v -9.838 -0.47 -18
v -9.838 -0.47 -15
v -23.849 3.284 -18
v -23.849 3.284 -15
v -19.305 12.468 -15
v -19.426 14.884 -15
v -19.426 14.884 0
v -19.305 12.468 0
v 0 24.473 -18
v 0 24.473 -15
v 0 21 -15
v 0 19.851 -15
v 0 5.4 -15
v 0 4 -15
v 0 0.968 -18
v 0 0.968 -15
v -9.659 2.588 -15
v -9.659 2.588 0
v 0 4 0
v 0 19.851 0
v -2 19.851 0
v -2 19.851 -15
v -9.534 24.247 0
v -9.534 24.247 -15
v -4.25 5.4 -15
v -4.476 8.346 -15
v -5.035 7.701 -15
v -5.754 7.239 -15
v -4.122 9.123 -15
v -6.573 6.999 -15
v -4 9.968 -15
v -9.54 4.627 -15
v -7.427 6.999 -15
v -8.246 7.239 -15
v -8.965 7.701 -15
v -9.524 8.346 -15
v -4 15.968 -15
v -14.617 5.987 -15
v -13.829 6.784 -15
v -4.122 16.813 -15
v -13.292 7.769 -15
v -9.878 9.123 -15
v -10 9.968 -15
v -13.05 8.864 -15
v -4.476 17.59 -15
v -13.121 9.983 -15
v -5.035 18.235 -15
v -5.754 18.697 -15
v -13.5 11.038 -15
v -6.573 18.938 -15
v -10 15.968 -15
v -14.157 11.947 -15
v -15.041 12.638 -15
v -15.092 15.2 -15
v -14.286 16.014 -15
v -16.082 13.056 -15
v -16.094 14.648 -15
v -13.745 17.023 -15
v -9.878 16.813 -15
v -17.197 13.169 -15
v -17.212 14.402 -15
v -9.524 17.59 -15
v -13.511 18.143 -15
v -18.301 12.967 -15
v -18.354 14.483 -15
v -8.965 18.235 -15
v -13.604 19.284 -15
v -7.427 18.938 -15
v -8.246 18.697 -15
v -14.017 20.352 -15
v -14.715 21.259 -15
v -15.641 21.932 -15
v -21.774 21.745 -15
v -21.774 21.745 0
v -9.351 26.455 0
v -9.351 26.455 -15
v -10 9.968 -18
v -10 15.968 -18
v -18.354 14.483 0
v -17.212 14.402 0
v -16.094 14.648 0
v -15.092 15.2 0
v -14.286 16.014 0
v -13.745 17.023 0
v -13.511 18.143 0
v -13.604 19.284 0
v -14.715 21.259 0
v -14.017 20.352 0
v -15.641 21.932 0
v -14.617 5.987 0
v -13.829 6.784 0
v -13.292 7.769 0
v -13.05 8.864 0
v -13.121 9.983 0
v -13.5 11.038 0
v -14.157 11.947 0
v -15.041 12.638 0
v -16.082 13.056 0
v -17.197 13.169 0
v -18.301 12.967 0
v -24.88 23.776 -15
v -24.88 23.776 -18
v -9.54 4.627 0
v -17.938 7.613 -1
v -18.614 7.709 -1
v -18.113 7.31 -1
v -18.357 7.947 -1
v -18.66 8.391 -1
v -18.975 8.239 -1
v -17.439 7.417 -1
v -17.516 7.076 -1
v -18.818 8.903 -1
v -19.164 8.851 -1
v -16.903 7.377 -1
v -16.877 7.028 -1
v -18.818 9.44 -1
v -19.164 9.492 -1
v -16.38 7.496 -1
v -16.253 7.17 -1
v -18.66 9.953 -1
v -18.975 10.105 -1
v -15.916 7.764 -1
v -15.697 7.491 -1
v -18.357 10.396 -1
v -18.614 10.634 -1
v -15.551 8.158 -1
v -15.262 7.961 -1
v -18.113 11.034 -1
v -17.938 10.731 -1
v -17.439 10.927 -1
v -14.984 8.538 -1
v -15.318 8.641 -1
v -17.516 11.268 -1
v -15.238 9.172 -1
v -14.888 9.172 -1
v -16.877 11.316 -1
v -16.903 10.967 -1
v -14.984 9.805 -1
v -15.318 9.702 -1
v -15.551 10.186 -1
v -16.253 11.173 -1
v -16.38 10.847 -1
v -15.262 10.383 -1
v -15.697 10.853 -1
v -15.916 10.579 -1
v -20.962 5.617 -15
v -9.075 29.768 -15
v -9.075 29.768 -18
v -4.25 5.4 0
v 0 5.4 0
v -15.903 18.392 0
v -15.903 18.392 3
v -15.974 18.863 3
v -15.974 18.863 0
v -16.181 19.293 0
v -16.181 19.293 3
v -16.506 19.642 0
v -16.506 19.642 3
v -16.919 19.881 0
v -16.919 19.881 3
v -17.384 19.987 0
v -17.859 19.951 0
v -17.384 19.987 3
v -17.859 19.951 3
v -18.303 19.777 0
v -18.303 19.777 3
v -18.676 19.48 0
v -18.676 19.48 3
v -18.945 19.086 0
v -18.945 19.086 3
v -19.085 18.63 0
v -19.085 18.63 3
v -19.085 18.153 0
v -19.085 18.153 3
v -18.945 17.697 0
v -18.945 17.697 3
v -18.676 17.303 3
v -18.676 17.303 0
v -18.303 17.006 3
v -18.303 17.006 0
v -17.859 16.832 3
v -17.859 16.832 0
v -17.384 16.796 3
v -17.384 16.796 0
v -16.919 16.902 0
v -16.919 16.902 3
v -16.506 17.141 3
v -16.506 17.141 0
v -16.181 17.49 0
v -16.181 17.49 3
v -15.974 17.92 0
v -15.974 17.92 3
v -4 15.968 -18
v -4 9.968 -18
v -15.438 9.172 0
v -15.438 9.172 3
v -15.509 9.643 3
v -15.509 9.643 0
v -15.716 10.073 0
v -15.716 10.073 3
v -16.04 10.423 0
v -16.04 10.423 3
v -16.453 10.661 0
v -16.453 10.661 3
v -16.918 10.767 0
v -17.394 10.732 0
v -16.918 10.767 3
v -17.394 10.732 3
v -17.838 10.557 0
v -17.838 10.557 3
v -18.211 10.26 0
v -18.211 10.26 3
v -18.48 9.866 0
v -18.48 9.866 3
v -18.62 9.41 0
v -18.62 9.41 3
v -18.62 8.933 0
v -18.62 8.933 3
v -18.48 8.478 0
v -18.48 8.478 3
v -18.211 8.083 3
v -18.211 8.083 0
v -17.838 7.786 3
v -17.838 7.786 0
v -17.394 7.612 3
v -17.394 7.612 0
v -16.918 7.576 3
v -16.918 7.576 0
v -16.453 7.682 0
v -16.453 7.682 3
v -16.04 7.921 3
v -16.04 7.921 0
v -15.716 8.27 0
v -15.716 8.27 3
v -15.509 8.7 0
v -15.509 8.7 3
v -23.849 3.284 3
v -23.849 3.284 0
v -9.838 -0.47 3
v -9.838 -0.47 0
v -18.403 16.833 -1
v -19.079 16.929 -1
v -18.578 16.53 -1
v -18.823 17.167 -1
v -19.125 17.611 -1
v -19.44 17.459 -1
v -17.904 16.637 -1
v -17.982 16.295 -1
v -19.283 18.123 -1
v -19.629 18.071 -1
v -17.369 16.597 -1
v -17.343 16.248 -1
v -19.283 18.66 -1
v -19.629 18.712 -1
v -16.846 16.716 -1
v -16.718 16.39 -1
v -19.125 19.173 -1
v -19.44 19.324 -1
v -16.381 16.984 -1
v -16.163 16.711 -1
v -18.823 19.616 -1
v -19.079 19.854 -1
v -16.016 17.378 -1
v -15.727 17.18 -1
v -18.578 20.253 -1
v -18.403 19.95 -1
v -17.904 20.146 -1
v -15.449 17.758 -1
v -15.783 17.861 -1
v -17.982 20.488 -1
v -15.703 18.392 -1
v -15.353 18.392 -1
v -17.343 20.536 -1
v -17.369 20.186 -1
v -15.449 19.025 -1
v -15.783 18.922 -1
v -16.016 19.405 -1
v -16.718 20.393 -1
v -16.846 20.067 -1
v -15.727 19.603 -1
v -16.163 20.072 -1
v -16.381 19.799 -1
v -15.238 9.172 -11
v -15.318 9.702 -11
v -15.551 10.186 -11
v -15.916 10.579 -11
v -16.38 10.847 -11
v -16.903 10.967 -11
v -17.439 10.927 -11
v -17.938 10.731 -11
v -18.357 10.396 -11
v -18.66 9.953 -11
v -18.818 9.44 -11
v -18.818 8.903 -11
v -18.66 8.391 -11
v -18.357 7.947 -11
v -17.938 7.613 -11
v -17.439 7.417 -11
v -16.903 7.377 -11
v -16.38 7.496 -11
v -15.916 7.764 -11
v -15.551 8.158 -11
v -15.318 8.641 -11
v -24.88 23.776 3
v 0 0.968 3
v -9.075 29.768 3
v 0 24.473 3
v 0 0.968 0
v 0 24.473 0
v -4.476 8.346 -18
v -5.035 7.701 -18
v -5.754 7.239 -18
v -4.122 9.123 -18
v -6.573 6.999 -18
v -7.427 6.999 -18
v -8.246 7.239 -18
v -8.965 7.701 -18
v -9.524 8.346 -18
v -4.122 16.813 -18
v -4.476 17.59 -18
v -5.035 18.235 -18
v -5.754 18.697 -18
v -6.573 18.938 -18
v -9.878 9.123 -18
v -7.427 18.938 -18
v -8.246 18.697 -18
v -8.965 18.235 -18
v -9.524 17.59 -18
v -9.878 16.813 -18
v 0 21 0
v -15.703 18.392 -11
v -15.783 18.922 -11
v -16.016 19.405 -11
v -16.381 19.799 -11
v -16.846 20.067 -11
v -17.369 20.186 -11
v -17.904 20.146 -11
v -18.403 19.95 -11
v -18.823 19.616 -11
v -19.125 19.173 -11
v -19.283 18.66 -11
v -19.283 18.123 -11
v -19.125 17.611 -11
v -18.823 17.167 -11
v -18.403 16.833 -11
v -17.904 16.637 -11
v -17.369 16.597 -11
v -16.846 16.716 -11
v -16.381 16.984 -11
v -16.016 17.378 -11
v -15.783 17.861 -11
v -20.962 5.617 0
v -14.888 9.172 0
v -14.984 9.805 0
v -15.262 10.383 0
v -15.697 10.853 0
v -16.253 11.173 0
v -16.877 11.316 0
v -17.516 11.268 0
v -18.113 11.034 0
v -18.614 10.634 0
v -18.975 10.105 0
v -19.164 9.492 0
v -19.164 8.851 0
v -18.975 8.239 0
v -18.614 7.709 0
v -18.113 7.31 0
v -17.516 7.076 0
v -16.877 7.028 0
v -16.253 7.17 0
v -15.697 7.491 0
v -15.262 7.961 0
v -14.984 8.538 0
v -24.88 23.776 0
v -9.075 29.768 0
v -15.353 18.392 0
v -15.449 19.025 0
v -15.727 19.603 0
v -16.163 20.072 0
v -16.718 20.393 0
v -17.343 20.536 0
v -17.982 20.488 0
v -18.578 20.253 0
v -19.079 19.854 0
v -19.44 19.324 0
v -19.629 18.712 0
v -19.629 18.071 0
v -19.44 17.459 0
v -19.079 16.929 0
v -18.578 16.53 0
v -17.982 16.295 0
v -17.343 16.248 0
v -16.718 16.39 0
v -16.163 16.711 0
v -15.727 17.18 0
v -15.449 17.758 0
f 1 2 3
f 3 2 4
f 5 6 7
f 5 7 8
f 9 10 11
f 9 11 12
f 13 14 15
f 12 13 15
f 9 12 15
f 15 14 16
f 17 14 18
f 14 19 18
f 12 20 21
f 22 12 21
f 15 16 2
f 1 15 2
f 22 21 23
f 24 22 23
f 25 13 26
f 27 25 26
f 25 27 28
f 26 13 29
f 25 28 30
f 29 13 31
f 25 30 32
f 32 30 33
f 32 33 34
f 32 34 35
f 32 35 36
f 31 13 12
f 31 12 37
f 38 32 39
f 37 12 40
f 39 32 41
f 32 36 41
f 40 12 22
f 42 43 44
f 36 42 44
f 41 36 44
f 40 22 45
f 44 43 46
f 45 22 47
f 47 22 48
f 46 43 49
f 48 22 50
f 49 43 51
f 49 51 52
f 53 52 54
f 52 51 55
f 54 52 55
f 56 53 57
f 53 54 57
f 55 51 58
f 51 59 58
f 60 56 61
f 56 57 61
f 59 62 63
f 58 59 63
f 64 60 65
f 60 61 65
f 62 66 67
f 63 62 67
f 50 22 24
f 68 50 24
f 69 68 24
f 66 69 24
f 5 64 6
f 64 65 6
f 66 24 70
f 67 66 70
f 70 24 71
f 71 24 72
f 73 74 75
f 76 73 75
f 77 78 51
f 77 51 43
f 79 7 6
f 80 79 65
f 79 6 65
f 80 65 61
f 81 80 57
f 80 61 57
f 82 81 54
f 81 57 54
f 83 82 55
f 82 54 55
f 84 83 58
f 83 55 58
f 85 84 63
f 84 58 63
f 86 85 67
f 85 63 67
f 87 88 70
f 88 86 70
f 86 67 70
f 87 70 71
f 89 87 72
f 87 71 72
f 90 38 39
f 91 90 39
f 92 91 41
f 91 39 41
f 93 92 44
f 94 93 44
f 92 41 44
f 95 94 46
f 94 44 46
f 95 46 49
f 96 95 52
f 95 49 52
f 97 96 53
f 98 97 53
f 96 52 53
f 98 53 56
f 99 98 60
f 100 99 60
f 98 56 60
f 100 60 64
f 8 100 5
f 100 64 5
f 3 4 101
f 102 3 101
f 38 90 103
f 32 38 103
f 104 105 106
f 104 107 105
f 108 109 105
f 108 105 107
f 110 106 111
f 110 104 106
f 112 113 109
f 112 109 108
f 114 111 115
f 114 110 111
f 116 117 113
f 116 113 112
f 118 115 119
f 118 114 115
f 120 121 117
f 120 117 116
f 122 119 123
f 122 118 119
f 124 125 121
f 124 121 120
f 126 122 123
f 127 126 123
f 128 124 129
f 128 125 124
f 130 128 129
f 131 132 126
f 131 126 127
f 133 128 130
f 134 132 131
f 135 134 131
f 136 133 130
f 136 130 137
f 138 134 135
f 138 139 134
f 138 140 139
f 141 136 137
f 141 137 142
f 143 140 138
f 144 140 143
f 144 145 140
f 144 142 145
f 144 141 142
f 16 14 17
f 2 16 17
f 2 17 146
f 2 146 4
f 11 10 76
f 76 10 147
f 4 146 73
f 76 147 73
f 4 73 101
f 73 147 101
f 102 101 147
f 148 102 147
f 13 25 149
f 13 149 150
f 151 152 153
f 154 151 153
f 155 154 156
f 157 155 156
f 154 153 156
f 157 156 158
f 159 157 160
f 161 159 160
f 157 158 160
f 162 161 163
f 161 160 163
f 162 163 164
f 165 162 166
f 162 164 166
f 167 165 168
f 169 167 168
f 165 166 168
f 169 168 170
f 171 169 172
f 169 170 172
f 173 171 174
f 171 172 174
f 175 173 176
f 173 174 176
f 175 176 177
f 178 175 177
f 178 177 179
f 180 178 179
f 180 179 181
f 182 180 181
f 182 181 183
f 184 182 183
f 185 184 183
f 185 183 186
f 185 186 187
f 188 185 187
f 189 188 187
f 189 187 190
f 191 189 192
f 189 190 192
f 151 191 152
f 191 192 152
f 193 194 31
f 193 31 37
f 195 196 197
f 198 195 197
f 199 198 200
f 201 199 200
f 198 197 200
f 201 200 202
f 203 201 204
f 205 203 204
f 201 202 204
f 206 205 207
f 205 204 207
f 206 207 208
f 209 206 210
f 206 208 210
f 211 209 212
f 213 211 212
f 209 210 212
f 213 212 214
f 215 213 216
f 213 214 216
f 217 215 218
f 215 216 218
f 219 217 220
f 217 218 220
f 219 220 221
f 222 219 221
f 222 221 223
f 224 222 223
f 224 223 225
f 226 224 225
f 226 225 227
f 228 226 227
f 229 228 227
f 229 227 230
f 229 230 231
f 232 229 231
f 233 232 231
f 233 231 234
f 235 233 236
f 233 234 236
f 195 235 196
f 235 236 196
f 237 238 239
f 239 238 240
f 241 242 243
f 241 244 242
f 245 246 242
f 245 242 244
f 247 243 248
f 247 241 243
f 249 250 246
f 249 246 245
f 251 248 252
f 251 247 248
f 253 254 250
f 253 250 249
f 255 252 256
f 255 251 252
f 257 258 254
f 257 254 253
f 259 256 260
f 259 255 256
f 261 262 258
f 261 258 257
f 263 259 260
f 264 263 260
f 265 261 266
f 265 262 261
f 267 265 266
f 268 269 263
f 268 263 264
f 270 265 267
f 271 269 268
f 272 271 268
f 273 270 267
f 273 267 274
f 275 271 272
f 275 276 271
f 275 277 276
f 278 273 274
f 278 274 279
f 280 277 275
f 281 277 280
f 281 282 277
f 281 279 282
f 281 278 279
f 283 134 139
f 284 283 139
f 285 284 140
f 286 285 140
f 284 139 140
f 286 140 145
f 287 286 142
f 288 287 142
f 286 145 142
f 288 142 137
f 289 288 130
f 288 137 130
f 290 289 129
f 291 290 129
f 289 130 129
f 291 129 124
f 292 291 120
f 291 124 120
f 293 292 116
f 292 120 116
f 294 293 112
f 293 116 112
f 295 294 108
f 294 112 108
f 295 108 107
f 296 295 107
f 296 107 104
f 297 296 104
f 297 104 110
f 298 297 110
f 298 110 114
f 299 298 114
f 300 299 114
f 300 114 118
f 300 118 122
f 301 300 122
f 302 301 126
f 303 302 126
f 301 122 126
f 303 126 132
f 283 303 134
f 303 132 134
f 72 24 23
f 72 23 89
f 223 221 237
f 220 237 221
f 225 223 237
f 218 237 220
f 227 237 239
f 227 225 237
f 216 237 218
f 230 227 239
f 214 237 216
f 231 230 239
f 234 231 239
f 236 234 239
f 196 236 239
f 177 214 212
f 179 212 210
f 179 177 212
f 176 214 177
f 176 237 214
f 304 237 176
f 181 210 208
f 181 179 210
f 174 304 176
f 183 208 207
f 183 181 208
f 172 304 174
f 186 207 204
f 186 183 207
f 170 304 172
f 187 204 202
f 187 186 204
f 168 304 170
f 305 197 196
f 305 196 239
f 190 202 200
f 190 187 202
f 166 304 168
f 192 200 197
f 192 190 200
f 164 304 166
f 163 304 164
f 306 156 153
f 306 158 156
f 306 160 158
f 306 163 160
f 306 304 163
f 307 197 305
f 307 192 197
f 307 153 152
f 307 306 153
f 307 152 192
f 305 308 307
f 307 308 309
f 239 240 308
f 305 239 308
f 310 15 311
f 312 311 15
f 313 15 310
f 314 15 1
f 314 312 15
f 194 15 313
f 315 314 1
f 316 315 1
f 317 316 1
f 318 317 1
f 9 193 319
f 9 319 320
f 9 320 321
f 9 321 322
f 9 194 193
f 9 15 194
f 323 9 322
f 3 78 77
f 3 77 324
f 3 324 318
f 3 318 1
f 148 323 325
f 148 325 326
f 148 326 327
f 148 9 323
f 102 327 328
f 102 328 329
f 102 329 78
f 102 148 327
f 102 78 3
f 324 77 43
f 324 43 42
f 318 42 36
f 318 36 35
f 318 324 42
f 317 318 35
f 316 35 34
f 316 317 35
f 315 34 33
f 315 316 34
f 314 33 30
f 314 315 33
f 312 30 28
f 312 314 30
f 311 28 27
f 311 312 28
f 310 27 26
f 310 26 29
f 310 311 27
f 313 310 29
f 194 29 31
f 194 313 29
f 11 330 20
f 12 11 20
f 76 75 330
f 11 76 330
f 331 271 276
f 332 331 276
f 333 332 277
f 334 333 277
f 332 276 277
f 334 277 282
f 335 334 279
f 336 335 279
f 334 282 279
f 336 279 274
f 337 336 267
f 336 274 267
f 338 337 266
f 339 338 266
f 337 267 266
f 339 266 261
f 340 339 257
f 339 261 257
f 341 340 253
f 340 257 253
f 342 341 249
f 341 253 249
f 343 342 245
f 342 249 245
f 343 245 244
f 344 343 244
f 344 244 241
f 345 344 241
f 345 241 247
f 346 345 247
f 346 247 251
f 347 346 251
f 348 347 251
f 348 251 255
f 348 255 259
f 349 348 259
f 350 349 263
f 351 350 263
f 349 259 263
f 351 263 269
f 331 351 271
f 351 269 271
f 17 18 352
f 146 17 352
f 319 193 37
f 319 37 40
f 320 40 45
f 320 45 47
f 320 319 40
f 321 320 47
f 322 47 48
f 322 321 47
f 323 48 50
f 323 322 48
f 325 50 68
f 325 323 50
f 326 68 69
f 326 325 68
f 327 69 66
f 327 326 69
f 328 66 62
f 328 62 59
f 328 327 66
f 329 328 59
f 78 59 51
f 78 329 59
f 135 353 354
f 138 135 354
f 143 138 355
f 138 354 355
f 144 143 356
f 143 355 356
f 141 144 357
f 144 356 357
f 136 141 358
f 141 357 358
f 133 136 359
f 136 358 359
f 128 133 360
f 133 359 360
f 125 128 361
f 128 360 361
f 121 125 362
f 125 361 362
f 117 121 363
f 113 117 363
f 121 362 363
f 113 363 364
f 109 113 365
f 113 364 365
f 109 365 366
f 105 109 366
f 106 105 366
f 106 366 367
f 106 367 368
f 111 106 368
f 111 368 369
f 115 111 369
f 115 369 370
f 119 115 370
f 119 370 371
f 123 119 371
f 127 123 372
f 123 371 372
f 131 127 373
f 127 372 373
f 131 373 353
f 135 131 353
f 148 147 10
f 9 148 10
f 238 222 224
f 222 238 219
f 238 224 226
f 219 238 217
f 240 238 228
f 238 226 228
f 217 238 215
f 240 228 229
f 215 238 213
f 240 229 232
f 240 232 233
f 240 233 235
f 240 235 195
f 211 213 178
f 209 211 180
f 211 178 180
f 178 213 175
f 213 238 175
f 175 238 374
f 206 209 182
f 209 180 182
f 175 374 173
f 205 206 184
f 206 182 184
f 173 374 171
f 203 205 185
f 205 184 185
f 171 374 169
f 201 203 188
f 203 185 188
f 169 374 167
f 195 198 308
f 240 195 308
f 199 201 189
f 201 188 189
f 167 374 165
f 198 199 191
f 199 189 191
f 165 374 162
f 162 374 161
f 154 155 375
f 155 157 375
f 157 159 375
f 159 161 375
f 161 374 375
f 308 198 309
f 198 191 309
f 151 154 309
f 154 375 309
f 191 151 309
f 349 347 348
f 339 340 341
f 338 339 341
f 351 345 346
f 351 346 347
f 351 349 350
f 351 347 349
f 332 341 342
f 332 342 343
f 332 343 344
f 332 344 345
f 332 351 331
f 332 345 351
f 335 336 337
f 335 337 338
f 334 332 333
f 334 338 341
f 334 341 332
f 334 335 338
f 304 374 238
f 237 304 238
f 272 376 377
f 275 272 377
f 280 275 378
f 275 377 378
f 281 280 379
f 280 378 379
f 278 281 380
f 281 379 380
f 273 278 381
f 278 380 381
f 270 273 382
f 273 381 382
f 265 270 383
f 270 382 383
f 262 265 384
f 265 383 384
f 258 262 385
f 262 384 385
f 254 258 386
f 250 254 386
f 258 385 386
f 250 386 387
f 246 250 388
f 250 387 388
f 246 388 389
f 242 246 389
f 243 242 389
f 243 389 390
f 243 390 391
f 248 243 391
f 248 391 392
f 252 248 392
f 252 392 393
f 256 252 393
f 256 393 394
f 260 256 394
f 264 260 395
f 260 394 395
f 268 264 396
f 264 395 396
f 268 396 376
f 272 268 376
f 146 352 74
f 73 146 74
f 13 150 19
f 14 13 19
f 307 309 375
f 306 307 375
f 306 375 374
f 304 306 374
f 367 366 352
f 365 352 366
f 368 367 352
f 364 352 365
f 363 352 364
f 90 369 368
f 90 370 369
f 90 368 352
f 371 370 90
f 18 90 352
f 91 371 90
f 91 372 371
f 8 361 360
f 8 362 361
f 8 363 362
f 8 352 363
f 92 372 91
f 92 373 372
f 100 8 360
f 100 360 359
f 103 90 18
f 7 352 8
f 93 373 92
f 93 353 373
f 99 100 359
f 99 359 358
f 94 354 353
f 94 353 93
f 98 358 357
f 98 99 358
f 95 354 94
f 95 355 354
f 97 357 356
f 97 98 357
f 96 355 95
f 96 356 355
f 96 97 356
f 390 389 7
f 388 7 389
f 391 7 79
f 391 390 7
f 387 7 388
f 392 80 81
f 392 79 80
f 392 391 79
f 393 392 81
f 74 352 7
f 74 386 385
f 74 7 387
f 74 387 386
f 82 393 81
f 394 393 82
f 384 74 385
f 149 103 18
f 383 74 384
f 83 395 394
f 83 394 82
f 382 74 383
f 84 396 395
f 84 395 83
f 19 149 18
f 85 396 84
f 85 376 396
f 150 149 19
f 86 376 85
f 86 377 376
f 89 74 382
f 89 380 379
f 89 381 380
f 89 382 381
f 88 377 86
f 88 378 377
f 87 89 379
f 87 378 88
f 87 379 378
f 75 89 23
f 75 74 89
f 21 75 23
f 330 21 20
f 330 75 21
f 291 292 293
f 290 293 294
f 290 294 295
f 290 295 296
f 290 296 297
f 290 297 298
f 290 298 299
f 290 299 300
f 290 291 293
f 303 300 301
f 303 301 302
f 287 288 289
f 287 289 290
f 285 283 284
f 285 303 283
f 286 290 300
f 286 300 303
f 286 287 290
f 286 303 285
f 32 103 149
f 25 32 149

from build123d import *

# Parameters (mm, degrees)
EXTRUDE_1_DEPTH     = 15
EXTRUDE_2_DEPTH     = 3
SKETCH_4_R          = 4
EXTRUDE_3_DEPTH     = 15
EXTRUDE_4_DEPTH     = 3
SKETCH_6_R          = 1.6
CUT_EXTRUDE_1_DEPTH = 3
CUT_EXTRUDE_3_DEPTH = 3
SKETCH_9_R          = 2.15
CUT_EXTRUDE_4_DEPTH = 1
SKETCH_10_R         = 1.8
CUT_EXTRUDE_5_DEPTH = 10


with BuildPart() as part:
    # 草图1 → 凸台-拉伸1 (new body)
    with BuildSketch(Plane.XY):
        Polygon((-1.29e-06, 20.99999997), (-1.203e-06, 19.851325014), (-2.000001203, 19.851325014), (-9.534071771, 24.246698834), (-19.703272348, 20.391514412), (-19.03799413, 7.171769436), (-9.540202332, 4.62684286), (-4.25044565, 5.4), (-1.06e-07, 5.4), (0, 4), (-9.659258026, 2.588191337), (-20.962273217, 5.61682624), (-21.773937734, 21.745413673), (-9.350615446, 26.455144608), align=None)
    extrude(amount=-EXTRUDE_1_DEPTH)

    # 草图2 → 凸台-拉伸2 (add)
    with BuildSketch(Plane(origin=(0, 0, -15), x_dir=(-1, 0, 0), z_dir=(0, 0, -1))):
        Polygon((1.203e-06, 24.473211103), (1.203e-06, 0.968124522), (9.837841565, -0.469785948), (23.848691848, 3.284411448), (24.879935811, 23.776262564), (9.075430959, 29.76781327), align=None)
    extrude(amount=EXTRUDE_2_DEPTH)

    # 草图4 → 凸台-拉伸3 (add)
    with BuildSketch(Plane.XY.offset(-15)):
        with Locations((-17.503272348, 18.391514412)):
            Circle(SKETCH_4_R)
        with Locations((-17.03799413, 9.171769436)):
            Circle(SKETCH_4_R)
    extrude(amount=EXTRUDE_3_DEPTH)

    # 草图8 → 切除-拉伸3 (cut)
    with BuildSketch(Plane(origin=(0, 0, -18), x_dir=(-1, 0, 0), z_dir=(0, 0, -1))):
        with BuildLine():
            Line((10.000001203, 15.968124522), (10.000001203, 9.968124522))
            ThreePointArc((10.000001203, 9.968124522), (7.000001203, 6.968124522), (4.000001203, 9.968124522))
            Line((4.000001203, 9.968124522), (4.000001203, 15.968124522))
            ThreePointArc((4.000001203, 15.968124522), (7.000001203, 18.968124522), (10.000001203, 15.968124522))
        make_face()
    extrude(amount=-CUT_EXTRUDE_3_DEPTH, mode=Mode.SUBTRACT)

    # 草图9 → 切除-拉伸4 (cut)
    with BuildSketch(Plane.XY):
        with Locations((-17.503272348, 18.391514412)):
            Circle(SKETCH_9_R)
        with Locations((-17.03799413, 9.171769436)):
            Circle(SKETCH_9_R)
    extrude(amount=-CUT_EXTRUDE_4_DEPTH, mode=Mode.SUBTRACT)

    # 草图10 → 切除-拉伸5 (cut)
    with BuildSketch(Plane.XY.offset(-1)):
        with Locations((-17.503272348, 18.391514412)):
            Circle(SKETCH_10_R)
        with Locations((-17.03799413, 9.171769436)):
            Circle(SKETCH_10_R)
    extrude(amount=-CUT_EXTRUDE_5_DEPTH, mode=Mode.SUBTRACT)


with BuildPart() as body_2:
    # 草图5 → 凸台-拉伸4 (new body)
    with BuildSketch(Plane.XY):
        Polygon((-1.203e-06, 24.473211103), (-9.075430959, 29.76781327), (-24.879935811, 23.776262564), (-23.848691848, 3.284411448), (-9.837841565, -0.469785948), (-1.203e-06, 0.968124522), align=None)
    extrude(amount=EXTRUDE_4_DEPTH)

    # 草图6 → 切除-拉伸1 (cut)
    with BuildSketch(Plane.XY.offset(3)):
        with Locations((-17.503272348, 18.391514412)):
            Circle(SKETCH_6_R)
        with Locations((-17.03799413, 9.171769436)):
            Circle(SKETCH_6_R)
    extrude(amount=-CUT_EXTRUDE_1_DEPTH, mode=Mode.SUBTRACT)


solid = Compound([part.part, body_2.part])
